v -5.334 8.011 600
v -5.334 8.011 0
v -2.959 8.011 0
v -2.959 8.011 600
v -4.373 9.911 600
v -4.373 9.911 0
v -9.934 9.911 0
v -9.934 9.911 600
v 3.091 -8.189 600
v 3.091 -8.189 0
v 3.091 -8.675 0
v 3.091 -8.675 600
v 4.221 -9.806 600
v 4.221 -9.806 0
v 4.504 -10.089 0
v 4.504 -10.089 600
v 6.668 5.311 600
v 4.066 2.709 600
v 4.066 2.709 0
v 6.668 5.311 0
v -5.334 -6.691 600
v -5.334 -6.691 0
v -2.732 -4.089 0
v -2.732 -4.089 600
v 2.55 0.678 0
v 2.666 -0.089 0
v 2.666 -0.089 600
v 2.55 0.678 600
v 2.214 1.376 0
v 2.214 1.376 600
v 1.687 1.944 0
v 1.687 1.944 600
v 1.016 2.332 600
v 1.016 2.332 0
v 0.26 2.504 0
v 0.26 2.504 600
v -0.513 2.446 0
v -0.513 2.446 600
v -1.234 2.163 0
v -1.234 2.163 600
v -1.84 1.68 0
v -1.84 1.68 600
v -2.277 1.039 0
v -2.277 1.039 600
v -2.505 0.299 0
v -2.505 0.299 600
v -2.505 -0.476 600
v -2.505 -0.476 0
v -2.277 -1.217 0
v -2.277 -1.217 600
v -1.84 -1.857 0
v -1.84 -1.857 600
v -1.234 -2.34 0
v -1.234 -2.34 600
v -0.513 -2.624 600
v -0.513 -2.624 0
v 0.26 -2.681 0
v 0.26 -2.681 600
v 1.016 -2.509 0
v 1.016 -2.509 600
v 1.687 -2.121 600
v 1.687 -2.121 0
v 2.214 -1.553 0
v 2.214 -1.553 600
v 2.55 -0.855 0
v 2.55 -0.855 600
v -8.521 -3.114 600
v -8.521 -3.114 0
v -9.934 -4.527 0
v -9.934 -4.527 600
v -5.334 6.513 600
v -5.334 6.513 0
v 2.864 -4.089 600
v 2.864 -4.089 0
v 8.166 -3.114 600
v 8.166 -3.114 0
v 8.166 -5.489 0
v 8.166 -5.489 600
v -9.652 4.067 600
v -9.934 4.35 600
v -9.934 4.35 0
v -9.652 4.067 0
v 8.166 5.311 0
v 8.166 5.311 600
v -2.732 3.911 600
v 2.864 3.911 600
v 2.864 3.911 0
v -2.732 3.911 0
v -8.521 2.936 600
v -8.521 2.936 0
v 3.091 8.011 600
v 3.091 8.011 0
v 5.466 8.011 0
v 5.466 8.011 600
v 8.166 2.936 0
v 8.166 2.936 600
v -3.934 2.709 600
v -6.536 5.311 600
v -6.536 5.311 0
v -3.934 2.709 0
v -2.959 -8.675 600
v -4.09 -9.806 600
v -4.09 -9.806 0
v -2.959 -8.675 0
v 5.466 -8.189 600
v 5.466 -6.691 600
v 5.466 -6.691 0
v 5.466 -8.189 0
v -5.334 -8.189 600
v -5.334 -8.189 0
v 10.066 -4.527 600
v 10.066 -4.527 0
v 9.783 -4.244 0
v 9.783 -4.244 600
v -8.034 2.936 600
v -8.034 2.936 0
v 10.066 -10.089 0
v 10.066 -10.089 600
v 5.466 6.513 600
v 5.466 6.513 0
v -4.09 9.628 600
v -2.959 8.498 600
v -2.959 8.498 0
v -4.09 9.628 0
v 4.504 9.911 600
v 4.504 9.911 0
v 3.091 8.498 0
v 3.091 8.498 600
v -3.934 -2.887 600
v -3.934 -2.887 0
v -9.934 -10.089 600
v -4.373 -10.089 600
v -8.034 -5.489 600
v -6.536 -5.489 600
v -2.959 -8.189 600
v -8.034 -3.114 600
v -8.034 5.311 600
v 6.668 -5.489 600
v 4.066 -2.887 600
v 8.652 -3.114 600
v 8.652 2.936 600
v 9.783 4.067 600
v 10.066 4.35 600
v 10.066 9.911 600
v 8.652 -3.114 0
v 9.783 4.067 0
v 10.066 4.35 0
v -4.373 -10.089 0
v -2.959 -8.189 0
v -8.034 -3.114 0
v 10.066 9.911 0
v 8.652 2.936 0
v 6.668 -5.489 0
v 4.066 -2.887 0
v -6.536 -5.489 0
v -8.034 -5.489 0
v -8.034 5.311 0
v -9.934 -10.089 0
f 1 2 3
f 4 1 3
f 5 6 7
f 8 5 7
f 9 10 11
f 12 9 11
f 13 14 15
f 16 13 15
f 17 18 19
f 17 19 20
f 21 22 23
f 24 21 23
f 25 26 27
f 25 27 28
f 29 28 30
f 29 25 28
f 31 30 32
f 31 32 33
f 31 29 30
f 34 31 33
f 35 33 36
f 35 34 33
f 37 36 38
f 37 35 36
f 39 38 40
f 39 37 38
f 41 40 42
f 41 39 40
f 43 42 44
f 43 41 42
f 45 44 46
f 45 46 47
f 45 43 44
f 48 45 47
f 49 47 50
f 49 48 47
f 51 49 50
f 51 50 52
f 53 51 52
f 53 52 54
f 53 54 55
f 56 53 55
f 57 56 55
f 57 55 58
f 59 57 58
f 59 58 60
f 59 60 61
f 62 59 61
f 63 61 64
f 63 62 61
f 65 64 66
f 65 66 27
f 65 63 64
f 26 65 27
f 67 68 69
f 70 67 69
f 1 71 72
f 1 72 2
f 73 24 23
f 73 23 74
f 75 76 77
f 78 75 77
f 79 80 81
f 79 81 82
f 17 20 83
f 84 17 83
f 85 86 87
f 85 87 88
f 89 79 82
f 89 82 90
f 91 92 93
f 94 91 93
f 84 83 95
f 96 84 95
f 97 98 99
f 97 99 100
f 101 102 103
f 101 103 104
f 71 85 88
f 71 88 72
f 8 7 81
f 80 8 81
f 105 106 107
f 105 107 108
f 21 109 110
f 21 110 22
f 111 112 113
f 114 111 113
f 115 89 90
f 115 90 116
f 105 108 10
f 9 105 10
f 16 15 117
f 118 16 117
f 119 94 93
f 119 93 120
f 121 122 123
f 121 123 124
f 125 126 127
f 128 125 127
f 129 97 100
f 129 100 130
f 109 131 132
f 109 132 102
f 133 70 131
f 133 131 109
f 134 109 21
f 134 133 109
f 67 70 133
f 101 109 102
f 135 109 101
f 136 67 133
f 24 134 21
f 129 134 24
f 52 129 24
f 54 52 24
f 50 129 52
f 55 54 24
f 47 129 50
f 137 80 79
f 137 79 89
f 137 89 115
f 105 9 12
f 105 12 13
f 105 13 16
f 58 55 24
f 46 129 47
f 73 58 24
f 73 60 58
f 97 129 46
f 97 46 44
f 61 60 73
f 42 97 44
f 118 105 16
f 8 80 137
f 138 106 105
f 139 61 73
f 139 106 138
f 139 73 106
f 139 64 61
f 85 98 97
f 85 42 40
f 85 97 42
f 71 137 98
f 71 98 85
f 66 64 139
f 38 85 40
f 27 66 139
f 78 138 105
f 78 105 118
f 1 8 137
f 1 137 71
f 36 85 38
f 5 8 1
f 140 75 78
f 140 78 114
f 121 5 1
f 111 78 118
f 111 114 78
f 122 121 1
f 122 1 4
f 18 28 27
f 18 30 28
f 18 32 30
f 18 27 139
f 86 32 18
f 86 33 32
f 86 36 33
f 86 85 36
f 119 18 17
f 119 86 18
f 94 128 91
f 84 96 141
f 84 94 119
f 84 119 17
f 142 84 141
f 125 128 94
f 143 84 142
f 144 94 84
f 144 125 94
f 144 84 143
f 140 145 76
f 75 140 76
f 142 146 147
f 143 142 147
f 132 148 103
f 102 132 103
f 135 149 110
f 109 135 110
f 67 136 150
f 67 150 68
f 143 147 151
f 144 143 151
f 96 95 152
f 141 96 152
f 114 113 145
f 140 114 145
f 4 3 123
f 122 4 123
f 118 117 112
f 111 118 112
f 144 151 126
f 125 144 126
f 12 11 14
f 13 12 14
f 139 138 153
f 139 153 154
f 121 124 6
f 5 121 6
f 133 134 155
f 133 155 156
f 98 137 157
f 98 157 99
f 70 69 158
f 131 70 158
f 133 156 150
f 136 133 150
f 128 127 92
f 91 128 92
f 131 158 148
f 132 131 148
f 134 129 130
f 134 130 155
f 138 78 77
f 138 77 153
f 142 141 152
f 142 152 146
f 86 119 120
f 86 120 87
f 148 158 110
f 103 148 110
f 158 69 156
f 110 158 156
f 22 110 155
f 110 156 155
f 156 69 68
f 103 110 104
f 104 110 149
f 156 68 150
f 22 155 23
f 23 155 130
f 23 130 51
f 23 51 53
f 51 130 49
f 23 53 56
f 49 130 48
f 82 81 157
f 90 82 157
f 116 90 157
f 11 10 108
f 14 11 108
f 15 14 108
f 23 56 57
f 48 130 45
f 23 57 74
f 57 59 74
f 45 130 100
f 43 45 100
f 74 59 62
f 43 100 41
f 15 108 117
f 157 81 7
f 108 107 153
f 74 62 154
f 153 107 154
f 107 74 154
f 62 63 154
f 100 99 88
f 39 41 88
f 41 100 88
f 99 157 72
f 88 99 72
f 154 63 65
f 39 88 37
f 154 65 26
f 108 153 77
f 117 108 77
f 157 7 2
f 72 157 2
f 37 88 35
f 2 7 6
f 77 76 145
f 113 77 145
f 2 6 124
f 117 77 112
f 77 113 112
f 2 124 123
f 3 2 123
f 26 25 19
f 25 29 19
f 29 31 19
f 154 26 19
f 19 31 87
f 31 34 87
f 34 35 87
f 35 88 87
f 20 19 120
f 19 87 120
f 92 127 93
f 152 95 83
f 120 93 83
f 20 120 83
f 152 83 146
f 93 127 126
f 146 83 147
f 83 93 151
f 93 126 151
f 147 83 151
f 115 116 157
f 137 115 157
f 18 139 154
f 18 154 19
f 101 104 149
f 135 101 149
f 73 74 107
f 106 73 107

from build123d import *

# Parameters (mm, degrees)
SKETCH_2_R      = 2.6
EXTRUDE_2_DEPTH = 600


with BuildPart() as part:
    # 草图2 → 凸台-拉伸2 (new body)
    with BuildSketch(Plane.XY):
        Polygon((4.504231687, -10.088707052), (10.065653044, -10.088707052), (10.065653044, -4.527285695), (9.782810331, -4.244442983), (8.6520744, -3.113707052), (8.165653044, -3.113707052), (8.165653044, -5.488707052), (6.667734572, -5.488707052), (4.065653044, -2.886625524), (4.065653044, 2.70921142), (6.667734572, 5.311292948), (8.165653044, 5.311292948), (8.165653044, 2.936292948), (8.6520744, 2.936292948), (9.782810331, 4.06702888), (10.065653044, 4.349871592), (10.065653044, 9.911292948), (4.504231687, 9.911292948), (4.221388975, 9.628450236), (3.090653044, 8.497714305), (3.090653044, 8.011292948), (5.465653044, 8.011292948), (5.465653044, 6.513374476), (2.863571516, 3.911292948), (-2.732265428, 3.911292948), (-5.334346956, 6.513374476), (-5.334346956, 8.011292948), (-2.959346956, 8.011292948), (-2.959346956, 8.497714305), (-4.090082888, 9.628450236), (-4.3729256, 9.911292948), (-9.934346956, 9.911292948), (-9.934346956, 4.349871592), (-9.651504244, 4.06702888), (-8.520768313, 2.936292948), (-8.034346956, 2.936292948), (-8.034346956, 5.311292948), (-6.536428484, 5.311292948), (-3.934346956, 2.70921142), (-3.934346956, -2.886625524), (-6.536428484, -5.488707052), (-8.034346956, -5.488707052), (-8.034346956, -3.113707052), (-8.520768313, -3.113707052), (-9.651504244, -4.244442983), (-9.934346956, -4.527285695), (-9.934346956, -10.088707052), (-4.3729256, -10.088707052), (-4.090082888, -9.805864339), (-2.959346956, -8.675128408), (-2.959346956, -8.188707052), (-5.334346956, -8.188707052), (-5.334346956, -6.69078858), (-2.732265428, -4.088707052), (2.863571516, -4.088707052), (5.465653044, -6.69078858), (5.465653044, -8.188707052), (3.090653044, -8.188707052), (3.090653044, -8.675128408), (4.221388975, -9.805864339), align=None)
        with Locations((0.065653044, -0.088707052)):
            Circle(SKETCH_2_R, mode=Mode.SUBTRACT)
    extrude(amount=EXTRUDE_2_DEPTH)


solid = part.part
